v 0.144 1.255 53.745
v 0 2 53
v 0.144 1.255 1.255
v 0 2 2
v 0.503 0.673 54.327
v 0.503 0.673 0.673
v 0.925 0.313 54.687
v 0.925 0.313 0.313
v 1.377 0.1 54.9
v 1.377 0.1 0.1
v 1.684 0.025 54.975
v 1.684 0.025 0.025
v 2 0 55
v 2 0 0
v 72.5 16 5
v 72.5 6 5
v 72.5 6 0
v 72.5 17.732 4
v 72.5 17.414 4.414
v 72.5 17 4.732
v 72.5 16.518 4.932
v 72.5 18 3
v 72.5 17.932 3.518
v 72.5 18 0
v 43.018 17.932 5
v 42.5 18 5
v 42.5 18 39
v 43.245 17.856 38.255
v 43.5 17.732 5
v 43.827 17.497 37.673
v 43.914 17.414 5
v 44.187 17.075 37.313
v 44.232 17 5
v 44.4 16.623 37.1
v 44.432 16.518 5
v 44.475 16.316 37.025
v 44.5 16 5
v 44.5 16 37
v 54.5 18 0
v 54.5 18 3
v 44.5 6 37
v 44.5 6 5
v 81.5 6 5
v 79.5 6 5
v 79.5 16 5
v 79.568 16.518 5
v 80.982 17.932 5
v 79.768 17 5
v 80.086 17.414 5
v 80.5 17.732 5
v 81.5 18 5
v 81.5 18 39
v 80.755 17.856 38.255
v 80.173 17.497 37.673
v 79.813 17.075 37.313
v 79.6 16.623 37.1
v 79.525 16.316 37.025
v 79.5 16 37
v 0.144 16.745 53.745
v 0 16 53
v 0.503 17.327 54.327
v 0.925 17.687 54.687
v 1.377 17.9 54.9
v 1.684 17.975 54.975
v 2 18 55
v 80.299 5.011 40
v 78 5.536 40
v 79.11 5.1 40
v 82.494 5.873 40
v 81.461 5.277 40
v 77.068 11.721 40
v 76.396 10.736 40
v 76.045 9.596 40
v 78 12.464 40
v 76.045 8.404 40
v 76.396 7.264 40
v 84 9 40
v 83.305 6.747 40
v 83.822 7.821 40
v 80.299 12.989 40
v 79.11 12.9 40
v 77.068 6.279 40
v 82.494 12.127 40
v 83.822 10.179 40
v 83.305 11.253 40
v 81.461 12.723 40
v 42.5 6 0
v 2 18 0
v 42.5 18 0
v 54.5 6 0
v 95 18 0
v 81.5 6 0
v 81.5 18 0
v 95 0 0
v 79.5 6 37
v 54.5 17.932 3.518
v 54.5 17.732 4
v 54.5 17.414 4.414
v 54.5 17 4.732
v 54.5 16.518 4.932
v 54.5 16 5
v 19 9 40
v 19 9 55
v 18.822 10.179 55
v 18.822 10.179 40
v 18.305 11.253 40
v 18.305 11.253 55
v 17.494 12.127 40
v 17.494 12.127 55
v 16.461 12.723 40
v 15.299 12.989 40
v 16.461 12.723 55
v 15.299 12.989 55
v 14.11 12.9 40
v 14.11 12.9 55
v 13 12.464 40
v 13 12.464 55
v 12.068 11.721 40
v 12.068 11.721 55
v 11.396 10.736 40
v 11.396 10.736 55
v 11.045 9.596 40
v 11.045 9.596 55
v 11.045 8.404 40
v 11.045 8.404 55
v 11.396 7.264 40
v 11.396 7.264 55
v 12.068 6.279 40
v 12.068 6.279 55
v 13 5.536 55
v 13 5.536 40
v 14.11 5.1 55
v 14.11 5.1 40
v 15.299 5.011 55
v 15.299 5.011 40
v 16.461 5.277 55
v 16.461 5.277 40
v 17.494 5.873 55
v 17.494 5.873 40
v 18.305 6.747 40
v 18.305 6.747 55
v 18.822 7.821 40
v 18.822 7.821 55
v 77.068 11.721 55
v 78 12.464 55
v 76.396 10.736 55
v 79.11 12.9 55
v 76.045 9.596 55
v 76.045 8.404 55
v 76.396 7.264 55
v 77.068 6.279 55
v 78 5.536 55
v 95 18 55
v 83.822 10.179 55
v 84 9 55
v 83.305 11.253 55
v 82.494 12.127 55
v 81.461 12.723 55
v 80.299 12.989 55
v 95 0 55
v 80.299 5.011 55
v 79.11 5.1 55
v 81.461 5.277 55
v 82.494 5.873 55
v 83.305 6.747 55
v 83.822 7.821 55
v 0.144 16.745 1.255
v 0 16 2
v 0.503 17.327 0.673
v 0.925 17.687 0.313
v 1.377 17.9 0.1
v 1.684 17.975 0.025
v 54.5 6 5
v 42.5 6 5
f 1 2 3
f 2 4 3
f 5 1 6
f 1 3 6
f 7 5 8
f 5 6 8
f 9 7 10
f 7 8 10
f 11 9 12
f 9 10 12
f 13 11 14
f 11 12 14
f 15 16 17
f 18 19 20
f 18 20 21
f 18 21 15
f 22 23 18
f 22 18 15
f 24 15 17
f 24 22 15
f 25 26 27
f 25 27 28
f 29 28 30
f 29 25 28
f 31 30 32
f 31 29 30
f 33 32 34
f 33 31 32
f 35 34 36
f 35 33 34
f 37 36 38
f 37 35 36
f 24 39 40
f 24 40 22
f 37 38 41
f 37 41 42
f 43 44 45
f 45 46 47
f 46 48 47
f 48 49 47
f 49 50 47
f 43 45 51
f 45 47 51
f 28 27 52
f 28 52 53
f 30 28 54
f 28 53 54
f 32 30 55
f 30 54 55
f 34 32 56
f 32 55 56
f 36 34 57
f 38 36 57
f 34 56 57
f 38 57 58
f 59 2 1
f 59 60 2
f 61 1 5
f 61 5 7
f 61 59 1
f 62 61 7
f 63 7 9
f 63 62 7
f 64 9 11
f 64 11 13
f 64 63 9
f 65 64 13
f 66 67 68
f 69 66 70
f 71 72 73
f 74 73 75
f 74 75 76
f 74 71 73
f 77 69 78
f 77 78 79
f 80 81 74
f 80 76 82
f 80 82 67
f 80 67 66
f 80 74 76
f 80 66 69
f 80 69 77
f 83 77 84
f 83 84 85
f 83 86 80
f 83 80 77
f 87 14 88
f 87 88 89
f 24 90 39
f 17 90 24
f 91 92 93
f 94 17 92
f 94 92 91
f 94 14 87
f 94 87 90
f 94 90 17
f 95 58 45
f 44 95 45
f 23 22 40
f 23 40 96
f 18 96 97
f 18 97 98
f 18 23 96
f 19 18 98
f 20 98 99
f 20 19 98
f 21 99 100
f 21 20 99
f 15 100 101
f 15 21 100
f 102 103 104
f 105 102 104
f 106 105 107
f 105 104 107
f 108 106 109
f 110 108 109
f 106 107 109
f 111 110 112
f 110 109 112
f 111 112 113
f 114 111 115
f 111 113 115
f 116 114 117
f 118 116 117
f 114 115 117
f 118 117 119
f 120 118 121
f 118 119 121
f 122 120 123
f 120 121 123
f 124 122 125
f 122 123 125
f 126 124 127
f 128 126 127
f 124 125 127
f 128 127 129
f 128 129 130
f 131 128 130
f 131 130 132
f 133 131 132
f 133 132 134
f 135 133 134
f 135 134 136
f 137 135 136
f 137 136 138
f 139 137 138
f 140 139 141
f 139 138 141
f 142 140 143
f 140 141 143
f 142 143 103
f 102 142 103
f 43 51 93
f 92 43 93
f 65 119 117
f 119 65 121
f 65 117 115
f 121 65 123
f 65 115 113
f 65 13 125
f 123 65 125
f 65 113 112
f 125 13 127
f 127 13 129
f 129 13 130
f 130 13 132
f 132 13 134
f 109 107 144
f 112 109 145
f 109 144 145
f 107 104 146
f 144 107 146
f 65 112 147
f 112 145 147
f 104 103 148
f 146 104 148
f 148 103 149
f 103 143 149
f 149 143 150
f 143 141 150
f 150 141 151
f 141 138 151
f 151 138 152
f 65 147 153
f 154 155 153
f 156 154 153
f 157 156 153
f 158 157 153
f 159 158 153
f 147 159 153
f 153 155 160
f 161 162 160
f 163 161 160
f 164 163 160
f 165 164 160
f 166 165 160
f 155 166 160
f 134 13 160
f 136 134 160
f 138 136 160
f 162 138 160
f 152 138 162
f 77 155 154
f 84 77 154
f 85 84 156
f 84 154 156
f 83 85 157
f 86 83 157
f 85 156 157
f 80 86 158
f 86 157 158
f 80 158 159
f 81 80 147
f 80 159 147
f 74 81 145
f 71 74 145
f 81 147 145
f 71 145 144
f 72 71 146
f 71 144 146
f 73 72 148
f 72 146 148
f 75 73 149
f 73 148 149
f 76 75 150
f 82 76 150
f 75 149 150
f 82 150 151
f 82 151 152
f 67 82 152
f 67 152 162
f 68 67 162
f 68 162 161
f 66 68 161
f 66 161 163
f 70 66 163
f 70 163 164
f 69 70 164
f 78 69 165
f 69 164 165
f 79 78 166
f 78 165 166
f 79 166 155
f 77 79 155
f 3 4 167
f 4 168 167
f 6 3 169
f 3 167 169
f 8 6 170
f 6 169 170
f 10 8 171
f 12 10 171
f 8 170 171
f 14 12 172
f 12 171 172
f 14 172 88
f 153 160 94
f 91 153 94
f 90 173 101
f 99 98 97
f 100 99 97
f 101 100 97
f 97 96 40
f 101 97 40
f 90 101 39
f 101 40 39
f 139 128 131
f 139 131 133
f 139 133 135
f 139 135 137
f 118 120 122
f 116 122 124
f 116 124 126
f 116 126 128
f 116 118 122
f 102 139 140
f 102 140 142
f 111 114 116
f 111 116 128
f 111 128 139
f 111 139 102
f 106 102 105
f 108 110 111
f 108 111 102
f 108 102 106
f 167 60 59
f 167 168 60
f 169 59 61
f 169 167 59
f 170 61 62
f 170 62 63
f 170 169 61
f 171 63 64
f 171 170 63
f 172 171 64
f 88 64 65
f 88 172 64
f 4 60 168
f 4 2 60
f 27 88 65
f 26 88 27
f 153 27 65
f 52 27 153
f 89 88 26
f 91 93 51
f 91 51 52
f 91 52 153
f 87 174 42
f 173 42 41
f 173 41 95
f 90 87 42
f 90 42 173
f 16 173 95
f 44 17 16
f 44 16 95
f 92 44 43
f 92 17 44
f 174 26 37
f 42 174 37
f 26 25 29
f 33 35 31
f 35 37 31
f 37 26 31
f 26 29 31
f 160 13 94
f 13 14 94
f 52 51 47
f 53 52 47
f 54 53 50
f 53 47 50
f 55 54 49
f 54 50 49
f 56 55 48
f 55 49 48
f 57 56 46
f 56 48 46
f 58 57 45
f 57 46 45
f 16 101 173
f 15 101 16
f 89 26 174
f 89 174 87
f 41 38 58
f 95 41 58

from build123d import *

# Parameters (mm, degrees)
SKETCH1_W           = 95
SKETCH1_H           = 55
BOSS_EXTRUDE1_DEPTH = 18
SKETCH2_R           = 4
CUT_EXTRUDE1_DEPTH  = 15
SKETCH3_W           = 35
SKETCH3_H           = 32
CUT_EXTRUDE2_DEPTH  = 12
FILLET2_R           = 2
SKETCH4_W           = 12
SKETCH4_H           = 5
CUT_EXTRUDE3_DEPTH  = 12
SKETCH5_W           = 9
SKETCH5_H           = 5
CUT_EXTRUDE4_DEPTH  = 12


with BuildPart() as part:
    # Sketch1 → Boss-Extrude1 (new body)
    with BuildSketch(Plane(origin=(0, 0, 0), x_dir=(1, 0, 0), z_dir=(0, 1, 0))):
        with Locations((47.5, -27.5)):
            Rectangle(SKETCH1_W, SKETCH1_H)
    extrude(amount=BOSS_EXTRUDE1_DEPTH)

    # Sketch2 → Cut-Extrude1 (cut)
    with BuildSketch(Plane.XY.offset(55)):
        with Locations((80, 9)):
            Circle(SKETCH2_R)
        with Locations((15, 9)):
            Circle(SKETCH2_R)
    extrude(amount=-CUT_EXTRUDE1_DEPTH, mode=Mode.SUBTRACT)

    # Sketch3 → Cut-Extrude2 (cut)
    with BuildSketch(Plane(origin=(0, 18, 0), x_dir=(1, 0, 0), z_dir=(0, 1, 0))):
        with Locations((62, -21)):
            Rectangle(SKETCH3_W, SKETCH3_H)
    extrude(amount=-CUT_EXTRUDE2_DEPTH, mode=Mode.SUBTRACT)

    # Fillet2
    fillet2_edges = [part.edges().sort_by_distance(p)[0] for p in [
        (44.5, 18, 21),
        (62, 18, 37),
        (79.5, 18, 21),
        (62, 18, 5),
        (0, 18, 27.5),
        (0, 0, 27.5),
        (0, 9, 0),
        (0, 9, 55),
    ]]
    fillet(fillet2_edges, radius=FILLET2_R)

    # Sketch4 → Cut-Extrude3 (cut)
    with BuildSketch(Plane(origin=(0, 18, 0), x_dir=(1, 0, 0), z_dir=(0, 1, 0))):
        with Locations((48.5, -2.5)):
            Rectangle(SKETCH4_W, SKETCH4_H)
    extrude(amount=-CUT_EXTRUDE3_DEPTH, mode=Mode.SUBTRACT)

    # Sketch5 → Cut-Extrude4 (cut)
    with BuildSketch(Plane(origin=(0, 18, 0), x_dir=(1, 0, 0), z_dir=(0, 1, 0))):
        with Locations((77, -2.5)):
            Rectangle(SKETCH5_W, SKETCH5_H)
    extrude(amount=-CUT_EXTRUDE4_DEPTH, mode=Mode.SUBTRACT)


solid = part.part
